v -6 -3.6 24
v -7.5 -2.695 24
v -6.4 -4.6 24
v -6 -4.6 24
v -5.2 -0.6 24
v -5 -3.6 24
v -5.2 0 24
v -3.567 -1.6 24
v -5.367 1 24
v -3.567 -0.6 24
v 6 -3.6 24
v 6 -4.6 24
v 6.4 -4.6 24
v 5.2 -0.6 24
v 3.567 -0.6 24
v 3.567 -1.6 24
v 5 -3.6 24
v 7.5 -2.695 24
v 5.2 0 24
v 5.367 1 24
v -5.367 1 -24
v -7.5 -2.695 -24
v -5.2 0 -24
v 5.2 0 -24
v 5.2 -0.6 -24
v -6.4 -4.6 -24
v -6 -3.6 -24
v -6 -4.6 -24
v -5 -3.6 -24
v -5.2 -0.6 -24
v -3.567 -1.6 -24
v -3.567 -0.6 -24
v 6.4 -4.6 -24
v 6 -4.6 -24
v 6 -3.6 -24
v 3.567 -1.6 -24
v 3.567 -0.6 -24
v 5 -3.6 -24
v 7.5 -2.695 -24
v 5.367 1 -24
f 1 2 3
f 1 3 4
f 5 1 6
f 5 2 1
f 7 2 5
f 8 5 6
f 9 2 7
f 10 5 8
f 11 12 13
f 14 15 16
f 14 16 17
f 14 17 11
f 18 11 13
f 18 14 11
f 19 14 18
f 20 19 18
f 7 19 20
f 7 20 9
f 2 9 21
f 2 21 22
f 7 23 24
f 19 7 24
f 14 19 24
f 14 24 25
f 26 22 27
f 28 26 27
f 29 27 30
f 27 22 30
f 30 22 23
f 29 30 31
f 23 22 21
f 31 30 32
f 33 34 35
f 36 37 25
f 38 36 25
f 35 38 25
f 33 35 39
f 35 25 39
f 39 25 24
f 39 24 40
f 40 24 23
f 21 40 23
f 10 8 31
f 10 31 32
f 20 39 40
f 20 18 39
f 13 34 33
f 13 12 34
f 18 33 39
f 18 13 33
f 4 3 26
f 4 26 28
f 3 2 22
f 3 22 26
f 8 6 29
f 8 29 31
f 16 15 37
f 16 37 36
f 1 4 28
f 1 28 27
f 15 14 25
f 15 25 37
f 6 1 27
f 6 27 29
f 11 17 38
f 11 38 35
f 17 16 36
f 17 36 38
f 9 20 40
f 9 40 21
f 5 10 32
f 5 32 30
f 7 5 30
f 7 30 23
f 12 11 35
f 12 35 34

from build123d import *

# Parameters (mm, degrees)
BOSS_EXTRUDE1_DEPTH = 24


with BuildPart() as part:
    # Sketch2 → Boss-Extrude1 (new body, symmetric)
    with BuildSketch(Plane.XY):
        Polygon((7.5, -2.694744112), (5.366838493, 1), (-5.366838493, 1), (-7.5, -2.694744112), (-6.4, -4.6), (-6, -4.6), (-6, -3.6), (-5, -3.6), (-3.56692895, -1.6), (-3.56692895, -0.6), (-5.2, -0.6), (-5.2, 0), (5.2, 0), (5.2, -0.6), (3.56692895, -0.6), (3.56692895, -1.6), (5, -3.6), (6, -3.6), (6, -4.6), (6.4, -4.6), align=None)
    extrude(amount=BOSS_EXTRUDE1_DEPTH, both=True)


solid = part.part
